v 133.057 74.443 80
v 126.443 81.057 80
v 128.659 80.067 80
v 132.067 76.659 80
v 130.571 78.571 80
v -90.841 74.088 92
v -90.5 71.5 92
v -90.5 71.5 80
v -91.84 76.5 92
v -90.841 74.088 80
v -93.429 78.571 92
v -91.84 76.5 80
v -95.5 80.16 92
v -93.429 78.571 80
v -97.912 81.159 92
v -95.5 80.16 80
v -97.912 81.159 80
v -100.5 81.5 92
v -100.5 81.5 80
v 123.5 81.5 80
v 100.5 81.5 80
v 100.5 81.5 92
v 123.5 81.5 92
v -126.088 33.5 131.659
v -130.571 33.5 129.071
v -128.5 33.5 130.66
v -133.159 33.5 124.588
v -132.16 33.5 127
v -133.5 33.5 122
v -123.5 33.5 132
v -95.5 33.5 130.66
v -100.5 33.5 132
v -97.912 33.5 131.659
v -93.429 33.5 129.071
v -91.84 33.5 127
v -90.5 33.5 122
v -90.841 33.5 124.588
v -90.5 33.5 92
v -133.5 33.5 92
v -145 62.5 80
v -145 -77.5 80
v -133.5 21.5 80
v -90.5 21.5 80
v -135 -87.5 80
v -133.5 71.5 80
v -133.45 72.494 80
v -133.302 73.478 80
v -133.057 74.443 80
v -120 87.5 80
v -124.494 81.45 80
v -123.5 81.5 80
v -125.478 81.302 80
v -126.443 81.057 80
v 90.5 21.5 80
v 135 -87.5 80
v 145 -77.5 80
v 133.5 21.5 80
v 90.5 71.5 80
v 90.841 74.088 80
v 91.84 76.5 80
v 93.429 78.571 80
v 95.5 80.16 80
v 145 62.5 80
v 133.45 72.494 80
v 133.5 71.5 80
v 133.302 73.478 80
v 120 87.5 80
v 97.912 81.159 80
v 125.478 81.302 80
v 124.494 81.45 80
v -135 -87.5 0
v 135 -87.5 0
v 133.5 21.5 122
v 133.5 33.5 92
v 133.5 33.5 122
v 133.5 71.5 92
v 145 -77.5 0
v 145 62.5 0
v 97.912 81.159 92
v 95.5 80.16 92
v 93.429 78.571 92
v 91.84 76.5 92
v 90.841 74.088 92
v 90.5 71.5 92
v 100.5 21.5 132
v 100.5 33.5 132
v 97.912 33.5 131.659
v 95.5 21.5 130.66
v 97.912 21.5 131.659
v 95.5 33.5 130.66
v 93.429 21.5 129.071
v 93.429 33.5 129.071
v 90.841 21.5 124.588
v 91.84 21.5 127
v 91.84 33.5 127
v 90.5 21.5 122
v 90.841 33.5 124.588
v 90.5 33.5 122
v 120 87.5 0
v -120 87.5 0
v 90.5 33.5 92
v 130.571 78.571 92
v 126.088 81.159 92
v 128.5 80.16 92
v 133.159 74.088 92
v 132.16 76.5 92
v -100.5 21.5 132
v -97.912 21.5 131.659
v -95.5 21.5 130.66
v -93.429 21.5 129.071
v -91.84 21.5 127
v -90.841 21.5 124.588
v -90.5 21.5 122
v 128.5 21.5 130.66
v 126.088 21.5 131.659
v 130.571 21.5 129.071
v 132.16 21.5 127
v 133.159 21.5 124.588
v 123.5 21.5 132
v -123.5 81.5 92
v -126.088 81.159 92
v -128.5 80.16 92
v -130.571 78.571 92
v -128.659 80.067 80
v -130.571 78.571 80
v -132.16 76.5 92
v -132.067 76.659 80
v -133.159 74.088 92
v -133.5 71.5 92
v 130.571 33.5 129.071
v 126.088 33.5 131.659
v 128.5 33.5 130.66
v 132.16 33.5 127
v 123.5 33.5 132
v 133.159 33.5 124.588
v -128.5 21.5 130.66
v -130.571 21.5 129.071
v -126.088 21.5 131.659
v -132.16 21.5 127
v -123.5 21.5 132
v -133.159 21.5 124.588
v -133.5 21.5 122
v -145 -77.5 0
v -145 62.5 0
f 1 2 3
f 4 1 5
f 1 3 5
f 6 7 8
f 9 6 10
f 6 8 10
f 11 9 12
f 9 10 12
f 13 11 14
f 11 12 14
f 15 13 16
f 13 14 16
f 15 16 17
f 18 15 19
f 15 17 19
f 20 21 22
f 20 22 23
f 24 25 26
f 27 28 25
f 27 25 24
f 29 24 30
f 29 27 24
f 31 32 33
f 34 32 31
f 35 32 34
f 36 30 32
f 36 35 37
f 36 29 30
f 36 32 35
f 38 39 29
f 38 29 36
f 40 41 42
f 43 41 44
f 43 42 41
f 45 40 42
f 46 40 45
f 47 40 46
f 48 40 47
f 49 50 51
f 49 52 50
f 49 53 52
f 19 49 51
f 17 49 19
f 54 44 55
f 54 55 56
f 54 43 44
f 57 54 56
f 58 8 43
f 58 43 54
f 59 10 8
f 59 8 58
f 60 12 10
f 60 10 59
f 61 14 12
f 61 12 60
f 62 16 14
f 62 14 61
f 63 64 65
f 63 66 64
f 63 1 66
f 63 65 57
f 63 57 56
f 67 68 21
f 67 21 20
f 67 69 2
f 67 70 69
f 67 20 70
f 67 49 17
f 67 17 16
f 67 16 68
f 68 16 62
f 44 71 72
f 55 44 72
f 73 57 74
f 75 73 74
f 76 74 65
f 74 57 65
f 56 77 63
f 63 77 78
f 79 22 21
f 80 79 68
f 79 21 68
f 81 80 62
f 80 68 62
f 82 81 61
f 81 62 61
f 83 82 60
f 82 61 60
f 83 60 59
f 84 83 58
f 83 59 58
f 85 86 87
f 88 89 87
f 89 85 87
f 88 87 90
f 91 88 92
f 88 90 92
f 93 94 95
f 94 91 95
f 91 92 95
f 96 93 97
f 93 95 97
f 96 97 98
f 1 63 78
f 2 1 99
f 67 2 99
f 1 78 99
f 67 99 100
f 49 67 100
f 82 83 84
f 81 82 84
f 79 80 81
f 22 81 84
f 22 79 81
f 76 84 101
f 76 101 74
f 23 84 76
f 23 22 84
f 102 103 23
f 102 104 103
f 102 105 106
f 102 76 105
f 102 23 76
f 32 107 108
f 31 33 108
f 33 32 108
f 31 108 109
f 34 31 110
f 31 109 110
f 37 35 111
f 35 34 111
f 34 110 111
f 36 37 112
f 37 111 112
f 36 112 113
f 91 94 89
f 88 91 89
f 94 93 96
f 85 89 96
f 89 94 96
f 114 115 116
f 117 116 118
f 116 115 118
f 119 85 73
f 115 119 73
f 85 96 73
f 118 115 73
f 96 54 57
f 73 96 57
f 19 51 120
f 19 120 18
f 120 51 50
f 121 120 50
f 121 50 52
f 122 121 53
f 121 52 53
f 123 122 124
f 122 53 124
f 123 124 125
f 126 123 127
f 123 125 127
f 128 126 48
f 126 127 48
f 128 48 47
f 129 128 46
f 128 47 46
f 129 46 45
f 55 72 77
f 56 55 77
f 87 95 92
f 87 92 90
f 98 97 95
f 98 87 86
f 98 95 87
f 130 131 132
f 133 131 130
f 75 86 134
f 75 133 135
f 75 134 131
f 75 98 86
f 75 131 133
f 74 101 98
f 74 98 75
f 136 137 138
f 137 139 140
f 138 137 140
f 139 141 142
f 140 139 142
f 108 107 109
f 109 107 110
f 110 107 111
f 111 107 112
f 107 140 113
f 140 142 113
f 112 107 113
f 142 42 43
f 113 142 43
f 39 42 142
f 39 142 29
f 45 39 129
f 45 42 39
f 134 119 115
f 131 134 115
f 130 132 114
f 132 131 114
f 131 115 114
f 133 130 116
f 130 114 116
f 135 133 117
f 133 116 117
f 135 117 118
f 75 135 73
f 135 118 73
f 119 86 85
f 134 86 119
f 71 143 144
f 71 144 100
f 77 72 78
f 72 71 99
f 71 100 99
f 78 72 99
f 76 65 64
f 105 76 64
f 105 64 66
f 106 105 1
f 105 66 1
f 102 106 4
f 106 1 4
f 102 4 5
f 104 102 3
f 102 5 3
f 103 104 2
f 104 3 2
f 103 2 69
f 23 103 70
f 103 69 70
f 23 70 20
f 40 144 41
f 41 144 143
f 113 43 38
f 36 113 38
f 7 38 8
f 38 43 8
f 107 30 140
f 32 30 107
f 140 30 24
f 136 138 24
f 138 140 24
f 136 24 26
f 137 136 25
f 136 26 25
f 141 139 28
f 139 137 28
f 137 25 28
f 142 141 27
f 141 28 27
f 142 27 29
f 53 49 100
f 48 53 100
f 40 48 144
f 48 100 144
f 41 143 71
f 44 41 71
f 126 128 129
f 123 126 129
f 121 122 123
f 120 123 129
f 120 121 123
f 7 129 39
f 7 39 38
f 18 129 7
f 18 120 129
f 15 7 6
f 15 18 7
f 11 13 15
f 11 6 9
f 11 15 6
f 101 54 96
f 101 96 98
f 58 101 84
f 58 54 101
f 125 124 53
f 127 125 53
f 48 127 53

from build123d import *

# Parameters (mm, degrees)
EXTRUDE_1_DEPTH = 80
SKETCH_2_W      = 43
SKETCH_2_H      = 60
EXTRUDE_2_DEPTH = 12
SKETCH_3_W      = 43
SKETCH_3_H      = 12
EXTRUDE_3_DEPTH = 40
FILLET_1_R      = 10


with BuildPart() as part:
    # 草图1 → 凸台-拉伸1 (new body)
    with BuildSketch(Plane.XY):
        Polygon((-145, -77.5), (-135, -87.5), (135, -87.5), (145, -77.5), (145, 62.5), (120, 87.5), (-120, 87.5), (-145, 62.5), align=None)
    extrude(amount=EXTRUDE_1_DEPTH)

    # 草图2 → 凸台-拉伸2 (add)
    with BuildSketch(Plane.XY.offset(80)):
        with Locations((-112, 51.5)):
            Rectangle(SKETCH_2_W, SKETCH_2_H)
        with Locations((112, 51.5)):
            Rectangle(SKETCH_2_W, SKETCH_2_H)
    extrude(amount=EXTRUDE_2_DEPTH)

    # 草图3 → 凸台-拉伸3 (add)
    with BuildSketch(Plane.XY.offset(92)):
        with Locations((-112, 27.5)):
            Rectangle(SKETCH_3_W, SKETCH_3_H)
        with Locations((112, 27.5)):
            Rectangle(SKETCH_3_W, SKETCH_3_H)
    extrude(amount=EXTRUDE_3_DEPTH)

    # 圆角1
    # the kernel refuses this fillet: 10 mm, written as the material it takes off along each edge
    with BuildSketch(Plane(origin=(-90.5, 81.5, 80), x_dir=(-1, 0, 0), z_dir=(0, 0, 1)), Plane(origin=(90.5, 81.5, 80), x_dir=(0, -1, 0), z_dir=(0, 0, 1))) as fillet_1_piece_1:
        with BuildLine():
            CenterArc((FILLET_1_R, FILLET_1_R), FILLET_1_R, 180, 90)
            Line((0, FILLET_1_R), (0, 0))
            Line((0, 0), (FILLET_1_R, 0))
        make_face()
    extrude(amount=37, mode=Mode.SUBTRACT)
    with BuildSketch(Plane(origin=(-133.5, 81.5, 80), x_dir=(1, 0, 0), z_dir=(0, 0, 1)), Plane(origin=(133.5, 81.5, 80), x_dir=(0, -1, 0), z_dir=(0, 0, 1))) as fillet_1_piece_2:
        with BuildLine():
            CenterArc((FILLET_1_R, -FILLET_1_R), FILLET_1_R, 90, 90)
            Line((0, -FILLET_1_R), (0, 0))
            Line((0, 0), (FILLET_1_R, 0))
        make_face()
    extrude(amount=37, mode=Mode.SUBTRACT)
    with BuildSketch(Plane(origin=(-133.5, 58.5, 132), x_dir=(1, 0, 0), z_dir=(0, -1, 0)), Plane(origin=(-90.5, -3.5, 132), x_dir=(-1, 0, 0), z_dir=(0, 1, 0)), Plane(origin=(90.5, 58.5, 132), x_dir=(1, 0, 0), z_dir=(0, -1, 0))) as fillet_1_piece_3:
        with BuildLine():
            CenterArc((FILLET_1_R, -FILLET_1_R), FILLET_1_R, 90, 90)
            Line((0, -FILLET_1_R), (0, 0))
            Line((0, 0), (FILLET_1_R, 0))
        make_face()
    extrude(amount=62, mode=Mode.SUBTRACT)
    with BuildSketch(Plane(origin=(133.5, -3.5, 132), x_dir=(0, 0, -1), z_dir=(0, 1, 0))) as fillet_1_piece_4:
        with BuildLine():
            CenterArc((FILLET_1_R, FILLET_1_R), FILLET_1_R, 180, 90)
            Line((0, FILLET_1_R), (0, 0))
            Line((0, 0), (FILLET_1_R, 0))
        make_face()
    extrude(amount=62, mode=Mode.SUBTRACT)


solid = part.part
